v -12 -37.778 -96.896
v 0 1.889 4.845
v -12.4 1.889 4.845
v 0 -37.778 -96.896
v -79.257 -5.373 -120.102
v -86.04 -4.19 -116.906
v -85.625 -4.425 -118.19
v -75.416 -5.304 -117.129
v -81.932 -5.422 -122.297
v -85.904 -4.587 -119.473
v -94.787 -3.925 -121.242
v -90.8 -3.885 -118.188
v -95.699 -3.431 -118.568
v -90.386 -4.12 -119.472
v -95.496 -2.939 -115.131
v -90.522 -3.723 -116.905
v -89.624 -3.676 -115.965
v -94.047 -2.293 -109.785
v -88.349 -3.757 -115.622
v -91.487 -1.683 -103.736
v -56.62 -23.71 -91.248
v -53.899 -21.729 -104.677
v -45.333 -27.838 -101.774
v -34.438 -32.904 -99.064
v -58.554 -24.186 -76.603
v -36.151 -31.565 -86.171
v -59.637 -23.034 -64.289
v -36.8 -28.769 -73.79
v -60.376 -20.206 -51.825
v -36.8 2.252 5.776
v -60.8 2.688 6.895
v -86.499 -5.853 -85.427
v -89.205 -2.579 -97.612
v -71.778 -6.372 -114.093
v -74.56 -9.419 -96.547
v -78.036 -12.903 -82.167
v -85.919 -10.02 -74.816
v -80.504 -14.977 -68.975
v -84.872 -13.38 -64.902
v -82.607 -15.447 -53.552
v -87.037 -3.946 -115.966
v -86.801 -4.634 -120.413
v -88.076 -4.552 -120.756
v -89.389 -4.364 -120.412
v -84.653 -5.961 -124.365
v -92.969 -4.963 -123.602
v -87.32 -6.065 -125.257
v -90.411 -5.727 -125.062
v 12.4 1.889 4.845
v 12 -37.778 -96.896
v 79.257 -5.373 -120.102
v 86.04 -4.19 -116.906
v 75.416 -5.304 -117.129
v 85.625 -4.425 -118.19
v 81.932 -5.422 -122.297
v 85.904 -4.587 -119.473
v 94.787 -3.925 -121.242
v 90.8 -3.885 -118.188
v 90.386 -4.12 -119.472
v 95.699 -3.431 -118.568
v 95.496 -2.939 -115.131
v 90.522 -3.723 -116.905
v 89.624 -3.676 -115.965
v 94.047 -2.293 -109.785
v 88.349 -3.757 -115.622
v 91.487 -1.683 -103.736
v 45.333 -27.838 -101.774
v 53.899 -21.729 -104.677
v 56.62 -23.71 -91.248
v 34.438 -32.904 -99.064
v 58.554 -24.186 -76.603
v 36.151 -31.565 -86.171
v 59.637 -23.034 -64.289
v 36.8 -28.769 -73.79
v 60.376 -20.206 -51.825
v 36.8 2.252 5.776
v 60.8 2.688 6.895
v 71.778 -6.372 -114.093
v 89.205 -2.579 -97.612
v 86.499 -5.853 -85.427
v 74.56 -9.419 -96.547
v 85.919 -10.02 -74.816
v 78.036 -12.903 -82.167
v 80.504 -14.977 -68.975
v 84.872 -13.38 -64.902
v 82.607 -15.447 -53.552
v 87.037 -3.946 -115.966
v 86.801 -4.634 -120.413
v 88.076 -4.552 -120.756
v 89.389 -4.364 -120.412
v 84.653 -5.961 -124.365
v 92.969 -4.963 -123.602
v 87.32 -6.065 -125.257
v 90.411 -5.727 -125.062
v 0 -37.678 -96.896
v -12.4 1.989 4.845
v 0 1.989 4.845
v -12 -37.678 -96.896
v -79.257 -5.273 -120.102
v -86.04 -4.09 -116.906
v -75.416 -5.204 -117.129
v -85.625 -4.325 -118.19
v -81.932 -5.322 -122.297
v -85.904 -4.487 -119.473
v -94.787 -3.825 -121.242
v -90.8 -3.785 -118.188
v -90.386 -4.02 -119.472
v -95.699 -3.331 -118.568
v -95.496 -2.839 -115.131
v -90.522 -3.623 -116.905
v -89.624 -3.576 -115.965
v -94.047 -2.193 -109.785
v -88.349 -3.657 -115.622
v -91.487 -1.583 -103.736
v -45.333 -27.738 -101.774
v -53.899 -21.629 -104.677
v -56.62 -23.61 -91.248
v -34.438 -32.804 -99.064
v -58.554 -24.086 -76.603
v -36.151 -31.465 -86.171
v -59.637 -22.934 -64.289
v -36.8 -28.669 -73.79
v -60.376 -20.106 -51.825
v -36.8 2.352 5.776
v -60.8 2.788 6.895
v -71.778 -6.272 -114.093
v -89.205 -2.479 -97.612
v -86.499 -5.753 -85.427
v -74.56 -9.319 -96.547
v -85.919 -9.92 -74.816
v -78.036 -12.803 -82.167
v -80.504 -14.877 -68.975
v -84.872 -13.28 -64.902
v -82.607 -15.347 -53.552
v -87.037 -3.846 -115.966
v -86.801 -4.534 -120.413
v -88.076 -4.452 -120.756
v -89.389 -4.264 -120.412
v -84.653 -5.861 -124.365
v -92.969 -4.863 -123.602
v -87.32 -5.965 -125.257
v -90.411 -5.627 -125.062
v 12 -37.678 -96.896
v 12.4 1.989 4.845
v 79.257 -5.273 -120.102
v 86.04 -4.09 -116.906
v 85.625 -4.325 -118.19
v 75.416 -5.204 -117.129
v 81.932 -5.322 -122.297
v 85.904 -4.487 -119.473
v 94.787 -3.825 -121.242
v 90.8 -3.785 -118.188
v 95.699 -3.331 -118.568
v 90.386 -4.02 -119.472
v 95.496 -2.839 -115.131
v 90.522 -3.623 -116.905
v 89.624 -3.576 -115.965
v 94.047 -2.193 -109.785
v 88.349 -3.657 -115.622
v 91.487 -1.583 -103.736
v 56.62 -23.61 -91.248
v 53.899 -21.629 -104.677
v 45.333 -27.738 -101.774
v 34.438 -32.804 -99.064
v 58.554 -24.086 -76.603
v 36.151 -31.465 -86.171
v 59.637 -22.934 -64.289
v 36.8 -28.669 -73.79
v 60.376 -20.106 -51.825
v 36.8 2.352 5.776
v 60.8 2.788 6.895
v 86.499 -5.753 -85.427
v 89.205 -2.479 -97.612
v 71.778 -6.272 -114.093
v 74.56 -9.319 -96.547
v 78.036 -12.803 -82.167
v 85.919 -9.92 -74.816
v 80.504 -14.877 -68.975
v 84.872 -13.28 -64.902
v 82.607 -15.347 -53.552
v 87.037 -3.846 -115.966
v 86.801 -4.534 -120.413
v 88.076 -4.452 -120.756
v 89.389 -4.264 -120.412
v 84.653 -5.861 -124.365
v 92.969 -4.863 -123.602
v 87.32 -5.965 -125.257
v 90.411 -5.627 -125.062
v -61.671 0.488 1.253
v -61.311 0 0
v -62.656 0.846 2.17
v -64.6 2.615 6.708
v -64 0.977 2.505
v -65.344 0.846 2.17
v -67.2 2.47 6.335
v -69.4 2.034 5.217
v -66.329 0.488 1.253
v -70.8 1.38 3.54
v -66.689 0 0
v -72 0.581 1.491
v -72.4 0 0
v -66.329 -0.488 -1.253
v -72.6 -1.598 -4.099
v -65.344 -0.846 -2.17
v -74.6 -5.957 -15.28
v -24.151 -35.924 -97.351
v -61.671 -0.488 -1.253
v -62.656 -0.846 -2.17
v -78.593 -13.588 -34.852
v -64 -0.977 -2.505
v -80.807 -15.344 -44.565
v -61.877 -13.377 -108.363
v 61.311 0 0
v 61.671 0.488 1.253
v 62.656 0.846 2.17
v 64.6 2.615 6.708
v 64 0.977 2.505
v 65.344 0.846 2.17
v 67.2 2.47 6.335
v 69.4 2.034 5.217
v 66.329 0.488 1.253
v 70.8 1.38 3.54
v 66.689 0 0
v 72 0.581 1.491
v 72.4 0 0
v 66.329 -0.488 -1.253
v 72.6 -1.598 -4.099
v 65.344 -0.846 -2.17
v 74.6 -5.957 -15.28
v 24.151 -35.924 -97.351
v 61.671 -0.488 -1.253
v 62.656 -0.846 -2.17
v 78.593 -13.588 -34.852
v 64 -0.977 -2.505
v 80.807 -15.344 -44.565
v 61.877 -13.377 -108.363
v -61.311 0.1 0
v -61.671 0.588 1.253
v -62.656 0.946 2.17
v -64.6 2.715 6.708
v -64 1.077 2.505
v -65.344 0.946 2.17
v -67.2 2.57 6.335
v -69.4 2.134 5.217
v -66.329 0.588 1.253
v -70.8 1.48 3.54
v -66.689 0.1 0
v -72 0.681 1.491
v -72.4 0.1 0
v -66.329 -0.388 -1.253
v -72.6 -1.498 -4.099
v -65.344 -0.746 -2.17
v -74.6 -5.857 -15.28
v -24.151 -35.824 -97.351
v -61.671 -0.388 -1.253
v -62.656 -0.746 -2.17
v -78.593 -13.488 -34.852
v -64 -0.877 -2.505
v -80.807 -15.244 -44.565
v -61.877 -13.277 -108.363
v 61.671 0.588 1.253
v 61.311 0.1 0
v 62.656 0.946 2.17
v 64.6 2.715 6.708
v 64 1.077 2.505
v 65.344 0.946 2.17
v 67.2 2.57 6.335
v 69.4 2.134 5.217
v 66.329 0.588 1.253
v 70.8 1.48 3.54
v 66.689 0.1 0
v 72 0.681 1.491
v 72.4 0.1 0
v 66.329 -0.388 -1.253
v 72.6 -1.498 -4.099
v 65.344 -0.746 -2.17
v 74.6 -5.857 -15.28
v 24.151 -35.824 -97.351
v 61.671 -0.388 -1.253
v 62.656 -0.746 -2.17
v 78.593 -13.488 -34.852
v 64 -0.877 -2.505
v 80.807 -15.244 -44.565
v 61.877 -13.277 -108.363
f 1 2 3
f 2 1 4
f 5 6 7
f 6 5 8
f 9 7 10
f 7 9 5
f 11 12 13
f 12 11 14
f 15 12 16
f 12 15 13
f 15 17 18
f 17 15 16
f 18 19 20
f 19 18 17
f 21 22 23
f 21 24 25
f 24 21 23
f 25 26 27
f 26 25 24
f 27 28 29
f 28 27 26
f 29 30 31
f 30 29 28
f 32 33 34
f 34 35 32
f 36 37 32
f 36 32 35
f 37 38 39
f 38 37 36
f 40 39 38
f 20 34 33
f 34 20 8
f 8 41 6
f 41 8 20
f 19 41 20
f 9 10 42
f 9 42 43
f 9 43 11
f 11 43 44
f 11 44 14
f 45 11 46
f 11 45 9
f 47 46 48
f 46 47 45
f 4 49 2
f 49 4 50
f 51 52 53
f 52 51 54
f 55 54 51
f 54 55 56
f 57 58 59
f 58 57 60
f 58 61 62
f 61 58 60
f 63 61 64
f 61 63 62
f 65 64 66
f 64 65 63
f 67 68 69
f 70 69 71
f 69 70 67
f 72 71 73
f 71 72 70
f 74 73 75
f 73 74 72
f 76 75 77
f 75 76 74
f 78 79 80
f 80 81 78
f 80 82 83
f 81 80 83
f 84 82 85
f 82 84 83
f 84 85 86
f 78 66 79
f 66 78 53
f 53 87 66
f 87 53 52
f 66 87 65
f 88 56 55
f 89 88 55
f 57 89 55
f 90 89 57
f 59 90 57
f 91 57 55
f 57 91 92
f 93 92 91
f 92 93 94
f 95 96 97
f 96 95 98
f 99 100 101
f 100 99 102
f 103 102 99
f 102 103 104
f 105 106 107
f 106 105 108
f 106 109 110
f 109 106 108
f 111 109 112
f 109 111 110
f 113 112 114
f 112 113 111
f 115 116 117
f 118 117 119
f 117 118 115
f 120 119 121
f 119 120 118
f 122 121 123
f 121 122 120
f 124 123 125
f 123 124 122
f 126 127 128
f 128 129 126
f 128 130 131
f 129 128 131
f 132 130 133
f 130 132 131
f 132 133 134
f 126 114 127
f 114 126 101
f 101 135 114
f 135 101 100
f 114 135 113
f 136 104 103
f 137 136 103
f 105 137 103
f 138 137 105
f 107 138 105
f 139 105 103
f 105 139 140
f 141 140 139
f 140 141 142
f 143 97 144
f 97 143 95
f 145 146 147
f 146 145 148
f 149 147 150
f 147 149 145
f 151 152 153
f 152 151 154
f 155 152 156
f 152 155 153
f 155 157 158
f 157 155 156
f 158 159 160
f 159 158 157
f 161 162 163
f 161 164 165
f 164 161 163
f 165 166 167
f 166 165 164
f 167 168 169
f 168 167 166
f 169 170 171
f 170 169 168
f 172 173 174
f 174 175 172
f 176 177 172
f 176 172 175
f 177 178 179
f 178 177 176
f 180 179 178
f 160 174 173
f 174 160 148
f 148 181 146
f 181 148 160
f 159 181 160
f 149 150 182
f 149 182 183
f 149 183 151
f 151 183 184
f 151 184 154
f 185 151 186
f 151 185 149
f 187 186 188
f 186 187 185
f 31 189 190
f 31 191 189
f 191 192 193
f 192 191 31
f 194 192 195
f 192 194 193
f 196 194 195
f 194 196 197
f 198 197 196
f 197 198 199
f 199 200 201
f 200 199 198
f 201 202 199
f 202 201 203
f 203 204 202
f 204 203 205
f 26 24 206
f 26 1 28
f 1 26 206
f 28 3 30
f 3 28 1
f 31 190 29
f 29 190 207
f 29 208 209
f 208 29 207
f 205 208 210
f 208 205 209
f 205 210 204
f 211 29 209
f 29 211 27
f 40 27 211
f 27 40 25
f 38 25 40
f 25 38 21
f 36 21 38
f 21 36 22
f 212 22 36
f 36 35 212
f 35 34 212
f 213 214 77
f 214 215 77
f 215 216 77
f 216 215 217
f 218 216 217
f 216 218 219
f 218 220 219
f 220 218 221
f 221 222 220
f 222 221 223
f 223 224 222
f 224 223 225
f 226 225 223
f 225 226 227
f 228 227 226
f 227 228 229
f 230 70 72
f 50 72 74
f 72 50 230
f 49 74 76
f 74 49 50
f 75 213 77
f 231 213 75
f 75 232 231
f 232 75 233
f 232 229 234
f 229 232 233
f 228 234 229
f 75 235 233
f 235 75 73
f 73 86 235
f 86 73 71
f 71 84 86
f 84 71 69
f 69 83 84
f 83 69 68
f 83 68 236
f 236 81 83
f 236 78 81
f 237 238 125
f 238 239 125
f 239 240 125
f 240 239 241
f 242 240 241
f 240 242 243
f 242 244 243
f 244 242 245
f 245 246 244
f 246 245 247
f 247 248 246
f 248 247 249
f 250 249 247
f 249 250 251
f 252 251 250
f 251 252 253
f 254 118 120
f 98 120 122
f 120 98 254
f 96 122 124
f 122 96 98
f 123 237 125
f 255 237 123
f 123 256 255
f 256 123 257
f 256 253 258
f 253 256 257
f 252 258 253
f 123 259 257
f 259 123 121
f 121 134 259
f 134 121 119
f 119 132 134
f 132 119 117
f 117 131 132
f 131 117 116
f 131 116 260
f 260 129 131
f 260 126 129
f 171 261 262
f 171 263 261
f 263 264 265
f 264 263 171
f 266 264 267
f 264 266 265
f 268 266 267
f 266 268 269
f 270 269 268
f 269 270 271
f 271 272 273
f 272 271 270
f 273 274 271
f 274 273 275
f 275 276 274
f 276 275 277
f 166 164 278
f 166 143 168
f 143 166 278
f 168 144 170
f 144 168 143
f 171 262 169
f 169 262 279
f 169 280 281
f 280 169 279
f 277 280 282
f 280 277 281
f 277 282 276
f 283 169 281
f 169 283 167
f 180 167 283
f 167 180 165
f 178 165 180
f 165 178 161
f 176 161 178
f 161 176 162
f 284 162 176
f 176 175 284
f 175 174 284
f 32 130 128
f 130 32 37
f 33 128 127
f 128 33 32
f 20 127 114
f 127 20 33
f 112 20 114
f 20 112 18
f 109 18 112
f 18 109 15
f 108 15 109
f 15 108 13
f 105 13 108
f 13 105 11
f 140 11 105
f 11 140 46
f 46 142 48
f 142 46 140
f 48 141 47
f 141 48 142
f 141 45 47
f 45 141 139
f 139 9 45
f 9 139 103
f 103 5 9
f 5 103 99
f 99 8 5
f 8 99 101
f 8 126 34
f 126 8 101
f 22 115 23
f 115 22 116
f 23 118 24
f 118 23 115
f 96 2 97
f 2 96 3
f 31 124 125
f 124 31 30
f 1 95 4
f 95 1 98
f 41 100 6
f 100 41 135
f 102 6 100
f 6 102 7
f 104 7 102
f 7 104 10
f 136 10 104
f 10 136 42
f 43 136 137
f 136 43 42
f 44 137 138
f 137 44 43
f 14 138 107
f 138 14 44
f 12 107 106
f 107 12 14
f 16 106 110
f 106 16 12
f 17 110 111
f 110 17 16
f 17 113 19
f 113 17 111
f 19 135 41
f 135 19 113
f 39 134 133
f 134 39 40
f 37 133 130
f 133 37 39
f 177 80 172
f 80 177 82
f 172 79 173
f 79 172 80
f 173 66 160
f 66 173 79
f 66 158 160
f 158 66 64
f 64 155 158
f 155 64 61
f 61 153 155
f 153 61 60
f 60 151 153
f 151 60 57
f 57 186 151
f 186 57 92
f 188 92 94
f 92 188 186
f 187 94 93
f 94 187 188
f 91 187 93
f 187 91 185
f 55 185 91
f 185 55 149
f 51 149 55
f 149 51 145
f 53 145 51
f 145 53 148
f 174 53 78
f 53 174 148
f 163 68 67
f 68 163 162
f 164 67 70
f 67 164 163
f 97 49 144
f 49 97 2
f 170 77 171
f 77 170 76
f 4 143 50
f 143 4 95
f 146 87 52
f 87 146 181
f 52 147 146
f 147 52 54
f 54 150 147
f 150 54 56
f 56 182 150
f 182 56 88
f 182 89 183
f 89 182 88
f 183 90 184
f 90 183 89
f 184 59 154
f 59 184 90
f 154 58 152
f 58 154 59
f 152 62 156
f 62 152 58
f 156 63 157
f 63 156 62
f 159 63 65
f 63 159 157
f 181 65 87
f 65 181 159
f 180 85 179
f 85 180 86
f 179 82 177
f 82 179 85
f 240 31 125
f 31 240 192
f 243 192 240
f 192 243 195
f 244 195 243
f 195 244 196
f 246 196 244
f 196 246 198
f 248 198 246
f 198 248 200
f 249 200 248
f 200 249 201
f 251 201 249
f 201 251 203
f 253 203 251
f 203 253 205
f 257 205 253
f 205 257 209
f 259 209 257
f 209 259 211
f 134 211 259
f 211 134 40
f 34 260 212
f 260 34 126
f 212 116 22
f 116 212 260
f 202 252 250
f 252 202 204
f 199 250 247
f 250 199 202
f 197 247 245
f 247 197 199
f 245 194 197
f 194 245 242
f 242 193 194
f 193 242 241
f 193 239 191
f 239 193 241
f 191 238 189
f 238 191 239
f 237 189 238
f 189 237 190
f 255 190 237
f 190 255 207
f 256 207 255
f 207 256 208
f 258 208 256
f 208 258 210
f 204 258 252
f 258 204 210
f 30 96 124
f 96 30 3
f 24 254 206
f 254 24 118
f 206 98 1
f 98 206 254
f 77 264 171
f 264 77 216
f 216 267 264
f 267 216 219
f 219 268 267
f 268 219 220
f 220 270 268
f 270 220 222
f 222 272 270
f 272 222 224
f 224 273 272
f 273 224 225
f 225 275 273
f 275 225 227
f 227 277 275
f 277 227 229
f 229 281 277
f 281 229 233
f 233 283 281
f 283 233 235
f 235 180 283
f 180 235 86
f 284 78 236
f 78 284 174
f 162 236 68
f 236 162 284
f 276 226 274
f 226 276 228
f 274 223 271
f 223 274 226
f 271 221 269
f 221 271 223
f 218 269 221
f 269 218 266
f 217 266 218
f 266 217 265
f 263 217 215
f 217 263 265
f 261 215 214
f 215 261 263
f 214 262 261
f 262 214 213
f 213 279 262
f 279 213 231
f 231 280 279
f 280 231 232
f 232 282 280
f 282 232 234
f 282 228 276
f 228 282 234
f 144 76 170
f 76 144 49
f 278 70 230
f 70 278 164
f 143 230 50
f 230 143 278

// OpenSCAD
use <../lib.scad>
use <s/u9494c01s01.scad>
use <s/u9494c01s02.scad>
use <s/u9494c01s03.scad>
use <s/u9494c01s04.scad>
function ldraw_lib__u9494c01() = [
// 0 Sail 27 x 17 Trapezoidal (Formed Shape 1)
// 0 Name: u9494c01.dat
// 0 Author: Philippe Hurbain [Philo]
// 0 !LDRAW_ORG Part UPDATE 2020-03
// 0 !LICENSE Licensed under CC BY 2.0 and CC BY 4.0 : see CAreadme.txt
// 
// 0 BFC CERTIFY CCW
  [0,"BFC","CERTIFY"],
  [0,"BFC","CCW"],
// 
// 0 !CATEGORY Sheet Fabric
// 
// 0 !HISTORY 2020-12-29 [PTadmin] Official Update 2020-03
// 
// 
// 1 16 0 0 0 1 0 0 0 1 0 0 0 1 s\u9494c01s01.dat
  [1,16,0,0,0,1,0,0,0,1,0,0,0,1, ldraw_lib__s__u9494c01s01()],
// 1 16 0 0 0 -1 0 0 0 1 0 0 0 1 s\u9494c01s01.dat
  [1,16,0,0,0,-1,0,0,0,1,0,0,0,1, ldraw_lib__s__u9494c01s01()],
// 0 BFC INVERTNEXT
  [0,"BFC","INVERTNEXT"],
// 1 16 0 0 .25 1 0 0 0 1 0 0 0 1 s\u9494c01s01.dat
  [1,16,0,0,.25,1,0,0,0,1,0,0,0,1, ldraw_lib__s__u9494c01s01()],
// 0 BFC INVERTNEXT
  [0,"BFC","INVERTNEXT"],
// 1 16 0 0 .25 -1 0 0 0 1 0 0 0 1 s\u9494c01s01.dat
  [1,16,0,0,.25,-1,0,0,0,1,0,0,0,1, ldraw_lib__s__u9494c01s01()],
// 
// 1 16 0 0 0 1 0 0 0 1 0 0 0 1 s\u9494c01s02.dat
  [1,16,0,0,0,1,0,0,0,1,0,0,0,1, ldraw_lib__s__u9494c01s02()],
// 1 16 0 0 0 -1 0 0 0 1 0 0 0 1 s\u9494c01s02.dat
  [1,16,0,0,0,-1,0,0,0,1,0,0,0,1, ldraw_lib__s__u9494c01s02()],
// 0 BFC INVERTNEXT
  [0,"BFC","INVERTNEXT"],
// 1 16 0 0 .25 1 0 0 0 1 0 0 0 1 s\u9494c01s02.dat
  [1,16,0,0,.25,1,0,0,0,1,0,0,0,1, ldraw_lib__s__u9494c01s02()],
// 0 BFC INVERTNEXT
  [0,"BFC","INVERTNEXT"],
// 1 16 0 0 .25 -1 0 0 0 1 0 0 0 1 s\u9494c01s02.dat
  [1,16,0,0,.25,-1,0,0,0,1,0,0,0,1, ldraw_lib__s__u9494c01s02()],
// 
// 1 16 0 0 0 1 0 0 0 1 0 0 0 1 s\u9494c01s03.dat
  [1,16,0,0,0,1,0,0,0,1,0,0,0,1, ldraw_lib__s__u9494c01s03()],
// 1 16 0 0 0 -1 0 0 0 1 0 0 0 1 s\u9494c01s03.dat
  [1,16,0,0,0,-1,0,0,0,1,0,0,0,1, ldraw_lib__s__u9494c01s03()],
// 
// 1 16 0 0 0 1 0 0 0 1 0 0 0 1 s\u9494c01s04.dat
  [1,16,0,0,0,1,0,0,0,1,0,0,0,1, ldraw_lib__s__u9494c01s04()],
// 1 16 0 0 0 -1 0 0 0 1 0 0 0 1 s\u9494c01s04.dat
  [1,16,0,0,0,-1,0,0,0,1,0,0,0,1, ldraw_lib__s__u9494c01s04()],
];
makepoly(ldraw_lib__u9494c01(), line=0.2);
